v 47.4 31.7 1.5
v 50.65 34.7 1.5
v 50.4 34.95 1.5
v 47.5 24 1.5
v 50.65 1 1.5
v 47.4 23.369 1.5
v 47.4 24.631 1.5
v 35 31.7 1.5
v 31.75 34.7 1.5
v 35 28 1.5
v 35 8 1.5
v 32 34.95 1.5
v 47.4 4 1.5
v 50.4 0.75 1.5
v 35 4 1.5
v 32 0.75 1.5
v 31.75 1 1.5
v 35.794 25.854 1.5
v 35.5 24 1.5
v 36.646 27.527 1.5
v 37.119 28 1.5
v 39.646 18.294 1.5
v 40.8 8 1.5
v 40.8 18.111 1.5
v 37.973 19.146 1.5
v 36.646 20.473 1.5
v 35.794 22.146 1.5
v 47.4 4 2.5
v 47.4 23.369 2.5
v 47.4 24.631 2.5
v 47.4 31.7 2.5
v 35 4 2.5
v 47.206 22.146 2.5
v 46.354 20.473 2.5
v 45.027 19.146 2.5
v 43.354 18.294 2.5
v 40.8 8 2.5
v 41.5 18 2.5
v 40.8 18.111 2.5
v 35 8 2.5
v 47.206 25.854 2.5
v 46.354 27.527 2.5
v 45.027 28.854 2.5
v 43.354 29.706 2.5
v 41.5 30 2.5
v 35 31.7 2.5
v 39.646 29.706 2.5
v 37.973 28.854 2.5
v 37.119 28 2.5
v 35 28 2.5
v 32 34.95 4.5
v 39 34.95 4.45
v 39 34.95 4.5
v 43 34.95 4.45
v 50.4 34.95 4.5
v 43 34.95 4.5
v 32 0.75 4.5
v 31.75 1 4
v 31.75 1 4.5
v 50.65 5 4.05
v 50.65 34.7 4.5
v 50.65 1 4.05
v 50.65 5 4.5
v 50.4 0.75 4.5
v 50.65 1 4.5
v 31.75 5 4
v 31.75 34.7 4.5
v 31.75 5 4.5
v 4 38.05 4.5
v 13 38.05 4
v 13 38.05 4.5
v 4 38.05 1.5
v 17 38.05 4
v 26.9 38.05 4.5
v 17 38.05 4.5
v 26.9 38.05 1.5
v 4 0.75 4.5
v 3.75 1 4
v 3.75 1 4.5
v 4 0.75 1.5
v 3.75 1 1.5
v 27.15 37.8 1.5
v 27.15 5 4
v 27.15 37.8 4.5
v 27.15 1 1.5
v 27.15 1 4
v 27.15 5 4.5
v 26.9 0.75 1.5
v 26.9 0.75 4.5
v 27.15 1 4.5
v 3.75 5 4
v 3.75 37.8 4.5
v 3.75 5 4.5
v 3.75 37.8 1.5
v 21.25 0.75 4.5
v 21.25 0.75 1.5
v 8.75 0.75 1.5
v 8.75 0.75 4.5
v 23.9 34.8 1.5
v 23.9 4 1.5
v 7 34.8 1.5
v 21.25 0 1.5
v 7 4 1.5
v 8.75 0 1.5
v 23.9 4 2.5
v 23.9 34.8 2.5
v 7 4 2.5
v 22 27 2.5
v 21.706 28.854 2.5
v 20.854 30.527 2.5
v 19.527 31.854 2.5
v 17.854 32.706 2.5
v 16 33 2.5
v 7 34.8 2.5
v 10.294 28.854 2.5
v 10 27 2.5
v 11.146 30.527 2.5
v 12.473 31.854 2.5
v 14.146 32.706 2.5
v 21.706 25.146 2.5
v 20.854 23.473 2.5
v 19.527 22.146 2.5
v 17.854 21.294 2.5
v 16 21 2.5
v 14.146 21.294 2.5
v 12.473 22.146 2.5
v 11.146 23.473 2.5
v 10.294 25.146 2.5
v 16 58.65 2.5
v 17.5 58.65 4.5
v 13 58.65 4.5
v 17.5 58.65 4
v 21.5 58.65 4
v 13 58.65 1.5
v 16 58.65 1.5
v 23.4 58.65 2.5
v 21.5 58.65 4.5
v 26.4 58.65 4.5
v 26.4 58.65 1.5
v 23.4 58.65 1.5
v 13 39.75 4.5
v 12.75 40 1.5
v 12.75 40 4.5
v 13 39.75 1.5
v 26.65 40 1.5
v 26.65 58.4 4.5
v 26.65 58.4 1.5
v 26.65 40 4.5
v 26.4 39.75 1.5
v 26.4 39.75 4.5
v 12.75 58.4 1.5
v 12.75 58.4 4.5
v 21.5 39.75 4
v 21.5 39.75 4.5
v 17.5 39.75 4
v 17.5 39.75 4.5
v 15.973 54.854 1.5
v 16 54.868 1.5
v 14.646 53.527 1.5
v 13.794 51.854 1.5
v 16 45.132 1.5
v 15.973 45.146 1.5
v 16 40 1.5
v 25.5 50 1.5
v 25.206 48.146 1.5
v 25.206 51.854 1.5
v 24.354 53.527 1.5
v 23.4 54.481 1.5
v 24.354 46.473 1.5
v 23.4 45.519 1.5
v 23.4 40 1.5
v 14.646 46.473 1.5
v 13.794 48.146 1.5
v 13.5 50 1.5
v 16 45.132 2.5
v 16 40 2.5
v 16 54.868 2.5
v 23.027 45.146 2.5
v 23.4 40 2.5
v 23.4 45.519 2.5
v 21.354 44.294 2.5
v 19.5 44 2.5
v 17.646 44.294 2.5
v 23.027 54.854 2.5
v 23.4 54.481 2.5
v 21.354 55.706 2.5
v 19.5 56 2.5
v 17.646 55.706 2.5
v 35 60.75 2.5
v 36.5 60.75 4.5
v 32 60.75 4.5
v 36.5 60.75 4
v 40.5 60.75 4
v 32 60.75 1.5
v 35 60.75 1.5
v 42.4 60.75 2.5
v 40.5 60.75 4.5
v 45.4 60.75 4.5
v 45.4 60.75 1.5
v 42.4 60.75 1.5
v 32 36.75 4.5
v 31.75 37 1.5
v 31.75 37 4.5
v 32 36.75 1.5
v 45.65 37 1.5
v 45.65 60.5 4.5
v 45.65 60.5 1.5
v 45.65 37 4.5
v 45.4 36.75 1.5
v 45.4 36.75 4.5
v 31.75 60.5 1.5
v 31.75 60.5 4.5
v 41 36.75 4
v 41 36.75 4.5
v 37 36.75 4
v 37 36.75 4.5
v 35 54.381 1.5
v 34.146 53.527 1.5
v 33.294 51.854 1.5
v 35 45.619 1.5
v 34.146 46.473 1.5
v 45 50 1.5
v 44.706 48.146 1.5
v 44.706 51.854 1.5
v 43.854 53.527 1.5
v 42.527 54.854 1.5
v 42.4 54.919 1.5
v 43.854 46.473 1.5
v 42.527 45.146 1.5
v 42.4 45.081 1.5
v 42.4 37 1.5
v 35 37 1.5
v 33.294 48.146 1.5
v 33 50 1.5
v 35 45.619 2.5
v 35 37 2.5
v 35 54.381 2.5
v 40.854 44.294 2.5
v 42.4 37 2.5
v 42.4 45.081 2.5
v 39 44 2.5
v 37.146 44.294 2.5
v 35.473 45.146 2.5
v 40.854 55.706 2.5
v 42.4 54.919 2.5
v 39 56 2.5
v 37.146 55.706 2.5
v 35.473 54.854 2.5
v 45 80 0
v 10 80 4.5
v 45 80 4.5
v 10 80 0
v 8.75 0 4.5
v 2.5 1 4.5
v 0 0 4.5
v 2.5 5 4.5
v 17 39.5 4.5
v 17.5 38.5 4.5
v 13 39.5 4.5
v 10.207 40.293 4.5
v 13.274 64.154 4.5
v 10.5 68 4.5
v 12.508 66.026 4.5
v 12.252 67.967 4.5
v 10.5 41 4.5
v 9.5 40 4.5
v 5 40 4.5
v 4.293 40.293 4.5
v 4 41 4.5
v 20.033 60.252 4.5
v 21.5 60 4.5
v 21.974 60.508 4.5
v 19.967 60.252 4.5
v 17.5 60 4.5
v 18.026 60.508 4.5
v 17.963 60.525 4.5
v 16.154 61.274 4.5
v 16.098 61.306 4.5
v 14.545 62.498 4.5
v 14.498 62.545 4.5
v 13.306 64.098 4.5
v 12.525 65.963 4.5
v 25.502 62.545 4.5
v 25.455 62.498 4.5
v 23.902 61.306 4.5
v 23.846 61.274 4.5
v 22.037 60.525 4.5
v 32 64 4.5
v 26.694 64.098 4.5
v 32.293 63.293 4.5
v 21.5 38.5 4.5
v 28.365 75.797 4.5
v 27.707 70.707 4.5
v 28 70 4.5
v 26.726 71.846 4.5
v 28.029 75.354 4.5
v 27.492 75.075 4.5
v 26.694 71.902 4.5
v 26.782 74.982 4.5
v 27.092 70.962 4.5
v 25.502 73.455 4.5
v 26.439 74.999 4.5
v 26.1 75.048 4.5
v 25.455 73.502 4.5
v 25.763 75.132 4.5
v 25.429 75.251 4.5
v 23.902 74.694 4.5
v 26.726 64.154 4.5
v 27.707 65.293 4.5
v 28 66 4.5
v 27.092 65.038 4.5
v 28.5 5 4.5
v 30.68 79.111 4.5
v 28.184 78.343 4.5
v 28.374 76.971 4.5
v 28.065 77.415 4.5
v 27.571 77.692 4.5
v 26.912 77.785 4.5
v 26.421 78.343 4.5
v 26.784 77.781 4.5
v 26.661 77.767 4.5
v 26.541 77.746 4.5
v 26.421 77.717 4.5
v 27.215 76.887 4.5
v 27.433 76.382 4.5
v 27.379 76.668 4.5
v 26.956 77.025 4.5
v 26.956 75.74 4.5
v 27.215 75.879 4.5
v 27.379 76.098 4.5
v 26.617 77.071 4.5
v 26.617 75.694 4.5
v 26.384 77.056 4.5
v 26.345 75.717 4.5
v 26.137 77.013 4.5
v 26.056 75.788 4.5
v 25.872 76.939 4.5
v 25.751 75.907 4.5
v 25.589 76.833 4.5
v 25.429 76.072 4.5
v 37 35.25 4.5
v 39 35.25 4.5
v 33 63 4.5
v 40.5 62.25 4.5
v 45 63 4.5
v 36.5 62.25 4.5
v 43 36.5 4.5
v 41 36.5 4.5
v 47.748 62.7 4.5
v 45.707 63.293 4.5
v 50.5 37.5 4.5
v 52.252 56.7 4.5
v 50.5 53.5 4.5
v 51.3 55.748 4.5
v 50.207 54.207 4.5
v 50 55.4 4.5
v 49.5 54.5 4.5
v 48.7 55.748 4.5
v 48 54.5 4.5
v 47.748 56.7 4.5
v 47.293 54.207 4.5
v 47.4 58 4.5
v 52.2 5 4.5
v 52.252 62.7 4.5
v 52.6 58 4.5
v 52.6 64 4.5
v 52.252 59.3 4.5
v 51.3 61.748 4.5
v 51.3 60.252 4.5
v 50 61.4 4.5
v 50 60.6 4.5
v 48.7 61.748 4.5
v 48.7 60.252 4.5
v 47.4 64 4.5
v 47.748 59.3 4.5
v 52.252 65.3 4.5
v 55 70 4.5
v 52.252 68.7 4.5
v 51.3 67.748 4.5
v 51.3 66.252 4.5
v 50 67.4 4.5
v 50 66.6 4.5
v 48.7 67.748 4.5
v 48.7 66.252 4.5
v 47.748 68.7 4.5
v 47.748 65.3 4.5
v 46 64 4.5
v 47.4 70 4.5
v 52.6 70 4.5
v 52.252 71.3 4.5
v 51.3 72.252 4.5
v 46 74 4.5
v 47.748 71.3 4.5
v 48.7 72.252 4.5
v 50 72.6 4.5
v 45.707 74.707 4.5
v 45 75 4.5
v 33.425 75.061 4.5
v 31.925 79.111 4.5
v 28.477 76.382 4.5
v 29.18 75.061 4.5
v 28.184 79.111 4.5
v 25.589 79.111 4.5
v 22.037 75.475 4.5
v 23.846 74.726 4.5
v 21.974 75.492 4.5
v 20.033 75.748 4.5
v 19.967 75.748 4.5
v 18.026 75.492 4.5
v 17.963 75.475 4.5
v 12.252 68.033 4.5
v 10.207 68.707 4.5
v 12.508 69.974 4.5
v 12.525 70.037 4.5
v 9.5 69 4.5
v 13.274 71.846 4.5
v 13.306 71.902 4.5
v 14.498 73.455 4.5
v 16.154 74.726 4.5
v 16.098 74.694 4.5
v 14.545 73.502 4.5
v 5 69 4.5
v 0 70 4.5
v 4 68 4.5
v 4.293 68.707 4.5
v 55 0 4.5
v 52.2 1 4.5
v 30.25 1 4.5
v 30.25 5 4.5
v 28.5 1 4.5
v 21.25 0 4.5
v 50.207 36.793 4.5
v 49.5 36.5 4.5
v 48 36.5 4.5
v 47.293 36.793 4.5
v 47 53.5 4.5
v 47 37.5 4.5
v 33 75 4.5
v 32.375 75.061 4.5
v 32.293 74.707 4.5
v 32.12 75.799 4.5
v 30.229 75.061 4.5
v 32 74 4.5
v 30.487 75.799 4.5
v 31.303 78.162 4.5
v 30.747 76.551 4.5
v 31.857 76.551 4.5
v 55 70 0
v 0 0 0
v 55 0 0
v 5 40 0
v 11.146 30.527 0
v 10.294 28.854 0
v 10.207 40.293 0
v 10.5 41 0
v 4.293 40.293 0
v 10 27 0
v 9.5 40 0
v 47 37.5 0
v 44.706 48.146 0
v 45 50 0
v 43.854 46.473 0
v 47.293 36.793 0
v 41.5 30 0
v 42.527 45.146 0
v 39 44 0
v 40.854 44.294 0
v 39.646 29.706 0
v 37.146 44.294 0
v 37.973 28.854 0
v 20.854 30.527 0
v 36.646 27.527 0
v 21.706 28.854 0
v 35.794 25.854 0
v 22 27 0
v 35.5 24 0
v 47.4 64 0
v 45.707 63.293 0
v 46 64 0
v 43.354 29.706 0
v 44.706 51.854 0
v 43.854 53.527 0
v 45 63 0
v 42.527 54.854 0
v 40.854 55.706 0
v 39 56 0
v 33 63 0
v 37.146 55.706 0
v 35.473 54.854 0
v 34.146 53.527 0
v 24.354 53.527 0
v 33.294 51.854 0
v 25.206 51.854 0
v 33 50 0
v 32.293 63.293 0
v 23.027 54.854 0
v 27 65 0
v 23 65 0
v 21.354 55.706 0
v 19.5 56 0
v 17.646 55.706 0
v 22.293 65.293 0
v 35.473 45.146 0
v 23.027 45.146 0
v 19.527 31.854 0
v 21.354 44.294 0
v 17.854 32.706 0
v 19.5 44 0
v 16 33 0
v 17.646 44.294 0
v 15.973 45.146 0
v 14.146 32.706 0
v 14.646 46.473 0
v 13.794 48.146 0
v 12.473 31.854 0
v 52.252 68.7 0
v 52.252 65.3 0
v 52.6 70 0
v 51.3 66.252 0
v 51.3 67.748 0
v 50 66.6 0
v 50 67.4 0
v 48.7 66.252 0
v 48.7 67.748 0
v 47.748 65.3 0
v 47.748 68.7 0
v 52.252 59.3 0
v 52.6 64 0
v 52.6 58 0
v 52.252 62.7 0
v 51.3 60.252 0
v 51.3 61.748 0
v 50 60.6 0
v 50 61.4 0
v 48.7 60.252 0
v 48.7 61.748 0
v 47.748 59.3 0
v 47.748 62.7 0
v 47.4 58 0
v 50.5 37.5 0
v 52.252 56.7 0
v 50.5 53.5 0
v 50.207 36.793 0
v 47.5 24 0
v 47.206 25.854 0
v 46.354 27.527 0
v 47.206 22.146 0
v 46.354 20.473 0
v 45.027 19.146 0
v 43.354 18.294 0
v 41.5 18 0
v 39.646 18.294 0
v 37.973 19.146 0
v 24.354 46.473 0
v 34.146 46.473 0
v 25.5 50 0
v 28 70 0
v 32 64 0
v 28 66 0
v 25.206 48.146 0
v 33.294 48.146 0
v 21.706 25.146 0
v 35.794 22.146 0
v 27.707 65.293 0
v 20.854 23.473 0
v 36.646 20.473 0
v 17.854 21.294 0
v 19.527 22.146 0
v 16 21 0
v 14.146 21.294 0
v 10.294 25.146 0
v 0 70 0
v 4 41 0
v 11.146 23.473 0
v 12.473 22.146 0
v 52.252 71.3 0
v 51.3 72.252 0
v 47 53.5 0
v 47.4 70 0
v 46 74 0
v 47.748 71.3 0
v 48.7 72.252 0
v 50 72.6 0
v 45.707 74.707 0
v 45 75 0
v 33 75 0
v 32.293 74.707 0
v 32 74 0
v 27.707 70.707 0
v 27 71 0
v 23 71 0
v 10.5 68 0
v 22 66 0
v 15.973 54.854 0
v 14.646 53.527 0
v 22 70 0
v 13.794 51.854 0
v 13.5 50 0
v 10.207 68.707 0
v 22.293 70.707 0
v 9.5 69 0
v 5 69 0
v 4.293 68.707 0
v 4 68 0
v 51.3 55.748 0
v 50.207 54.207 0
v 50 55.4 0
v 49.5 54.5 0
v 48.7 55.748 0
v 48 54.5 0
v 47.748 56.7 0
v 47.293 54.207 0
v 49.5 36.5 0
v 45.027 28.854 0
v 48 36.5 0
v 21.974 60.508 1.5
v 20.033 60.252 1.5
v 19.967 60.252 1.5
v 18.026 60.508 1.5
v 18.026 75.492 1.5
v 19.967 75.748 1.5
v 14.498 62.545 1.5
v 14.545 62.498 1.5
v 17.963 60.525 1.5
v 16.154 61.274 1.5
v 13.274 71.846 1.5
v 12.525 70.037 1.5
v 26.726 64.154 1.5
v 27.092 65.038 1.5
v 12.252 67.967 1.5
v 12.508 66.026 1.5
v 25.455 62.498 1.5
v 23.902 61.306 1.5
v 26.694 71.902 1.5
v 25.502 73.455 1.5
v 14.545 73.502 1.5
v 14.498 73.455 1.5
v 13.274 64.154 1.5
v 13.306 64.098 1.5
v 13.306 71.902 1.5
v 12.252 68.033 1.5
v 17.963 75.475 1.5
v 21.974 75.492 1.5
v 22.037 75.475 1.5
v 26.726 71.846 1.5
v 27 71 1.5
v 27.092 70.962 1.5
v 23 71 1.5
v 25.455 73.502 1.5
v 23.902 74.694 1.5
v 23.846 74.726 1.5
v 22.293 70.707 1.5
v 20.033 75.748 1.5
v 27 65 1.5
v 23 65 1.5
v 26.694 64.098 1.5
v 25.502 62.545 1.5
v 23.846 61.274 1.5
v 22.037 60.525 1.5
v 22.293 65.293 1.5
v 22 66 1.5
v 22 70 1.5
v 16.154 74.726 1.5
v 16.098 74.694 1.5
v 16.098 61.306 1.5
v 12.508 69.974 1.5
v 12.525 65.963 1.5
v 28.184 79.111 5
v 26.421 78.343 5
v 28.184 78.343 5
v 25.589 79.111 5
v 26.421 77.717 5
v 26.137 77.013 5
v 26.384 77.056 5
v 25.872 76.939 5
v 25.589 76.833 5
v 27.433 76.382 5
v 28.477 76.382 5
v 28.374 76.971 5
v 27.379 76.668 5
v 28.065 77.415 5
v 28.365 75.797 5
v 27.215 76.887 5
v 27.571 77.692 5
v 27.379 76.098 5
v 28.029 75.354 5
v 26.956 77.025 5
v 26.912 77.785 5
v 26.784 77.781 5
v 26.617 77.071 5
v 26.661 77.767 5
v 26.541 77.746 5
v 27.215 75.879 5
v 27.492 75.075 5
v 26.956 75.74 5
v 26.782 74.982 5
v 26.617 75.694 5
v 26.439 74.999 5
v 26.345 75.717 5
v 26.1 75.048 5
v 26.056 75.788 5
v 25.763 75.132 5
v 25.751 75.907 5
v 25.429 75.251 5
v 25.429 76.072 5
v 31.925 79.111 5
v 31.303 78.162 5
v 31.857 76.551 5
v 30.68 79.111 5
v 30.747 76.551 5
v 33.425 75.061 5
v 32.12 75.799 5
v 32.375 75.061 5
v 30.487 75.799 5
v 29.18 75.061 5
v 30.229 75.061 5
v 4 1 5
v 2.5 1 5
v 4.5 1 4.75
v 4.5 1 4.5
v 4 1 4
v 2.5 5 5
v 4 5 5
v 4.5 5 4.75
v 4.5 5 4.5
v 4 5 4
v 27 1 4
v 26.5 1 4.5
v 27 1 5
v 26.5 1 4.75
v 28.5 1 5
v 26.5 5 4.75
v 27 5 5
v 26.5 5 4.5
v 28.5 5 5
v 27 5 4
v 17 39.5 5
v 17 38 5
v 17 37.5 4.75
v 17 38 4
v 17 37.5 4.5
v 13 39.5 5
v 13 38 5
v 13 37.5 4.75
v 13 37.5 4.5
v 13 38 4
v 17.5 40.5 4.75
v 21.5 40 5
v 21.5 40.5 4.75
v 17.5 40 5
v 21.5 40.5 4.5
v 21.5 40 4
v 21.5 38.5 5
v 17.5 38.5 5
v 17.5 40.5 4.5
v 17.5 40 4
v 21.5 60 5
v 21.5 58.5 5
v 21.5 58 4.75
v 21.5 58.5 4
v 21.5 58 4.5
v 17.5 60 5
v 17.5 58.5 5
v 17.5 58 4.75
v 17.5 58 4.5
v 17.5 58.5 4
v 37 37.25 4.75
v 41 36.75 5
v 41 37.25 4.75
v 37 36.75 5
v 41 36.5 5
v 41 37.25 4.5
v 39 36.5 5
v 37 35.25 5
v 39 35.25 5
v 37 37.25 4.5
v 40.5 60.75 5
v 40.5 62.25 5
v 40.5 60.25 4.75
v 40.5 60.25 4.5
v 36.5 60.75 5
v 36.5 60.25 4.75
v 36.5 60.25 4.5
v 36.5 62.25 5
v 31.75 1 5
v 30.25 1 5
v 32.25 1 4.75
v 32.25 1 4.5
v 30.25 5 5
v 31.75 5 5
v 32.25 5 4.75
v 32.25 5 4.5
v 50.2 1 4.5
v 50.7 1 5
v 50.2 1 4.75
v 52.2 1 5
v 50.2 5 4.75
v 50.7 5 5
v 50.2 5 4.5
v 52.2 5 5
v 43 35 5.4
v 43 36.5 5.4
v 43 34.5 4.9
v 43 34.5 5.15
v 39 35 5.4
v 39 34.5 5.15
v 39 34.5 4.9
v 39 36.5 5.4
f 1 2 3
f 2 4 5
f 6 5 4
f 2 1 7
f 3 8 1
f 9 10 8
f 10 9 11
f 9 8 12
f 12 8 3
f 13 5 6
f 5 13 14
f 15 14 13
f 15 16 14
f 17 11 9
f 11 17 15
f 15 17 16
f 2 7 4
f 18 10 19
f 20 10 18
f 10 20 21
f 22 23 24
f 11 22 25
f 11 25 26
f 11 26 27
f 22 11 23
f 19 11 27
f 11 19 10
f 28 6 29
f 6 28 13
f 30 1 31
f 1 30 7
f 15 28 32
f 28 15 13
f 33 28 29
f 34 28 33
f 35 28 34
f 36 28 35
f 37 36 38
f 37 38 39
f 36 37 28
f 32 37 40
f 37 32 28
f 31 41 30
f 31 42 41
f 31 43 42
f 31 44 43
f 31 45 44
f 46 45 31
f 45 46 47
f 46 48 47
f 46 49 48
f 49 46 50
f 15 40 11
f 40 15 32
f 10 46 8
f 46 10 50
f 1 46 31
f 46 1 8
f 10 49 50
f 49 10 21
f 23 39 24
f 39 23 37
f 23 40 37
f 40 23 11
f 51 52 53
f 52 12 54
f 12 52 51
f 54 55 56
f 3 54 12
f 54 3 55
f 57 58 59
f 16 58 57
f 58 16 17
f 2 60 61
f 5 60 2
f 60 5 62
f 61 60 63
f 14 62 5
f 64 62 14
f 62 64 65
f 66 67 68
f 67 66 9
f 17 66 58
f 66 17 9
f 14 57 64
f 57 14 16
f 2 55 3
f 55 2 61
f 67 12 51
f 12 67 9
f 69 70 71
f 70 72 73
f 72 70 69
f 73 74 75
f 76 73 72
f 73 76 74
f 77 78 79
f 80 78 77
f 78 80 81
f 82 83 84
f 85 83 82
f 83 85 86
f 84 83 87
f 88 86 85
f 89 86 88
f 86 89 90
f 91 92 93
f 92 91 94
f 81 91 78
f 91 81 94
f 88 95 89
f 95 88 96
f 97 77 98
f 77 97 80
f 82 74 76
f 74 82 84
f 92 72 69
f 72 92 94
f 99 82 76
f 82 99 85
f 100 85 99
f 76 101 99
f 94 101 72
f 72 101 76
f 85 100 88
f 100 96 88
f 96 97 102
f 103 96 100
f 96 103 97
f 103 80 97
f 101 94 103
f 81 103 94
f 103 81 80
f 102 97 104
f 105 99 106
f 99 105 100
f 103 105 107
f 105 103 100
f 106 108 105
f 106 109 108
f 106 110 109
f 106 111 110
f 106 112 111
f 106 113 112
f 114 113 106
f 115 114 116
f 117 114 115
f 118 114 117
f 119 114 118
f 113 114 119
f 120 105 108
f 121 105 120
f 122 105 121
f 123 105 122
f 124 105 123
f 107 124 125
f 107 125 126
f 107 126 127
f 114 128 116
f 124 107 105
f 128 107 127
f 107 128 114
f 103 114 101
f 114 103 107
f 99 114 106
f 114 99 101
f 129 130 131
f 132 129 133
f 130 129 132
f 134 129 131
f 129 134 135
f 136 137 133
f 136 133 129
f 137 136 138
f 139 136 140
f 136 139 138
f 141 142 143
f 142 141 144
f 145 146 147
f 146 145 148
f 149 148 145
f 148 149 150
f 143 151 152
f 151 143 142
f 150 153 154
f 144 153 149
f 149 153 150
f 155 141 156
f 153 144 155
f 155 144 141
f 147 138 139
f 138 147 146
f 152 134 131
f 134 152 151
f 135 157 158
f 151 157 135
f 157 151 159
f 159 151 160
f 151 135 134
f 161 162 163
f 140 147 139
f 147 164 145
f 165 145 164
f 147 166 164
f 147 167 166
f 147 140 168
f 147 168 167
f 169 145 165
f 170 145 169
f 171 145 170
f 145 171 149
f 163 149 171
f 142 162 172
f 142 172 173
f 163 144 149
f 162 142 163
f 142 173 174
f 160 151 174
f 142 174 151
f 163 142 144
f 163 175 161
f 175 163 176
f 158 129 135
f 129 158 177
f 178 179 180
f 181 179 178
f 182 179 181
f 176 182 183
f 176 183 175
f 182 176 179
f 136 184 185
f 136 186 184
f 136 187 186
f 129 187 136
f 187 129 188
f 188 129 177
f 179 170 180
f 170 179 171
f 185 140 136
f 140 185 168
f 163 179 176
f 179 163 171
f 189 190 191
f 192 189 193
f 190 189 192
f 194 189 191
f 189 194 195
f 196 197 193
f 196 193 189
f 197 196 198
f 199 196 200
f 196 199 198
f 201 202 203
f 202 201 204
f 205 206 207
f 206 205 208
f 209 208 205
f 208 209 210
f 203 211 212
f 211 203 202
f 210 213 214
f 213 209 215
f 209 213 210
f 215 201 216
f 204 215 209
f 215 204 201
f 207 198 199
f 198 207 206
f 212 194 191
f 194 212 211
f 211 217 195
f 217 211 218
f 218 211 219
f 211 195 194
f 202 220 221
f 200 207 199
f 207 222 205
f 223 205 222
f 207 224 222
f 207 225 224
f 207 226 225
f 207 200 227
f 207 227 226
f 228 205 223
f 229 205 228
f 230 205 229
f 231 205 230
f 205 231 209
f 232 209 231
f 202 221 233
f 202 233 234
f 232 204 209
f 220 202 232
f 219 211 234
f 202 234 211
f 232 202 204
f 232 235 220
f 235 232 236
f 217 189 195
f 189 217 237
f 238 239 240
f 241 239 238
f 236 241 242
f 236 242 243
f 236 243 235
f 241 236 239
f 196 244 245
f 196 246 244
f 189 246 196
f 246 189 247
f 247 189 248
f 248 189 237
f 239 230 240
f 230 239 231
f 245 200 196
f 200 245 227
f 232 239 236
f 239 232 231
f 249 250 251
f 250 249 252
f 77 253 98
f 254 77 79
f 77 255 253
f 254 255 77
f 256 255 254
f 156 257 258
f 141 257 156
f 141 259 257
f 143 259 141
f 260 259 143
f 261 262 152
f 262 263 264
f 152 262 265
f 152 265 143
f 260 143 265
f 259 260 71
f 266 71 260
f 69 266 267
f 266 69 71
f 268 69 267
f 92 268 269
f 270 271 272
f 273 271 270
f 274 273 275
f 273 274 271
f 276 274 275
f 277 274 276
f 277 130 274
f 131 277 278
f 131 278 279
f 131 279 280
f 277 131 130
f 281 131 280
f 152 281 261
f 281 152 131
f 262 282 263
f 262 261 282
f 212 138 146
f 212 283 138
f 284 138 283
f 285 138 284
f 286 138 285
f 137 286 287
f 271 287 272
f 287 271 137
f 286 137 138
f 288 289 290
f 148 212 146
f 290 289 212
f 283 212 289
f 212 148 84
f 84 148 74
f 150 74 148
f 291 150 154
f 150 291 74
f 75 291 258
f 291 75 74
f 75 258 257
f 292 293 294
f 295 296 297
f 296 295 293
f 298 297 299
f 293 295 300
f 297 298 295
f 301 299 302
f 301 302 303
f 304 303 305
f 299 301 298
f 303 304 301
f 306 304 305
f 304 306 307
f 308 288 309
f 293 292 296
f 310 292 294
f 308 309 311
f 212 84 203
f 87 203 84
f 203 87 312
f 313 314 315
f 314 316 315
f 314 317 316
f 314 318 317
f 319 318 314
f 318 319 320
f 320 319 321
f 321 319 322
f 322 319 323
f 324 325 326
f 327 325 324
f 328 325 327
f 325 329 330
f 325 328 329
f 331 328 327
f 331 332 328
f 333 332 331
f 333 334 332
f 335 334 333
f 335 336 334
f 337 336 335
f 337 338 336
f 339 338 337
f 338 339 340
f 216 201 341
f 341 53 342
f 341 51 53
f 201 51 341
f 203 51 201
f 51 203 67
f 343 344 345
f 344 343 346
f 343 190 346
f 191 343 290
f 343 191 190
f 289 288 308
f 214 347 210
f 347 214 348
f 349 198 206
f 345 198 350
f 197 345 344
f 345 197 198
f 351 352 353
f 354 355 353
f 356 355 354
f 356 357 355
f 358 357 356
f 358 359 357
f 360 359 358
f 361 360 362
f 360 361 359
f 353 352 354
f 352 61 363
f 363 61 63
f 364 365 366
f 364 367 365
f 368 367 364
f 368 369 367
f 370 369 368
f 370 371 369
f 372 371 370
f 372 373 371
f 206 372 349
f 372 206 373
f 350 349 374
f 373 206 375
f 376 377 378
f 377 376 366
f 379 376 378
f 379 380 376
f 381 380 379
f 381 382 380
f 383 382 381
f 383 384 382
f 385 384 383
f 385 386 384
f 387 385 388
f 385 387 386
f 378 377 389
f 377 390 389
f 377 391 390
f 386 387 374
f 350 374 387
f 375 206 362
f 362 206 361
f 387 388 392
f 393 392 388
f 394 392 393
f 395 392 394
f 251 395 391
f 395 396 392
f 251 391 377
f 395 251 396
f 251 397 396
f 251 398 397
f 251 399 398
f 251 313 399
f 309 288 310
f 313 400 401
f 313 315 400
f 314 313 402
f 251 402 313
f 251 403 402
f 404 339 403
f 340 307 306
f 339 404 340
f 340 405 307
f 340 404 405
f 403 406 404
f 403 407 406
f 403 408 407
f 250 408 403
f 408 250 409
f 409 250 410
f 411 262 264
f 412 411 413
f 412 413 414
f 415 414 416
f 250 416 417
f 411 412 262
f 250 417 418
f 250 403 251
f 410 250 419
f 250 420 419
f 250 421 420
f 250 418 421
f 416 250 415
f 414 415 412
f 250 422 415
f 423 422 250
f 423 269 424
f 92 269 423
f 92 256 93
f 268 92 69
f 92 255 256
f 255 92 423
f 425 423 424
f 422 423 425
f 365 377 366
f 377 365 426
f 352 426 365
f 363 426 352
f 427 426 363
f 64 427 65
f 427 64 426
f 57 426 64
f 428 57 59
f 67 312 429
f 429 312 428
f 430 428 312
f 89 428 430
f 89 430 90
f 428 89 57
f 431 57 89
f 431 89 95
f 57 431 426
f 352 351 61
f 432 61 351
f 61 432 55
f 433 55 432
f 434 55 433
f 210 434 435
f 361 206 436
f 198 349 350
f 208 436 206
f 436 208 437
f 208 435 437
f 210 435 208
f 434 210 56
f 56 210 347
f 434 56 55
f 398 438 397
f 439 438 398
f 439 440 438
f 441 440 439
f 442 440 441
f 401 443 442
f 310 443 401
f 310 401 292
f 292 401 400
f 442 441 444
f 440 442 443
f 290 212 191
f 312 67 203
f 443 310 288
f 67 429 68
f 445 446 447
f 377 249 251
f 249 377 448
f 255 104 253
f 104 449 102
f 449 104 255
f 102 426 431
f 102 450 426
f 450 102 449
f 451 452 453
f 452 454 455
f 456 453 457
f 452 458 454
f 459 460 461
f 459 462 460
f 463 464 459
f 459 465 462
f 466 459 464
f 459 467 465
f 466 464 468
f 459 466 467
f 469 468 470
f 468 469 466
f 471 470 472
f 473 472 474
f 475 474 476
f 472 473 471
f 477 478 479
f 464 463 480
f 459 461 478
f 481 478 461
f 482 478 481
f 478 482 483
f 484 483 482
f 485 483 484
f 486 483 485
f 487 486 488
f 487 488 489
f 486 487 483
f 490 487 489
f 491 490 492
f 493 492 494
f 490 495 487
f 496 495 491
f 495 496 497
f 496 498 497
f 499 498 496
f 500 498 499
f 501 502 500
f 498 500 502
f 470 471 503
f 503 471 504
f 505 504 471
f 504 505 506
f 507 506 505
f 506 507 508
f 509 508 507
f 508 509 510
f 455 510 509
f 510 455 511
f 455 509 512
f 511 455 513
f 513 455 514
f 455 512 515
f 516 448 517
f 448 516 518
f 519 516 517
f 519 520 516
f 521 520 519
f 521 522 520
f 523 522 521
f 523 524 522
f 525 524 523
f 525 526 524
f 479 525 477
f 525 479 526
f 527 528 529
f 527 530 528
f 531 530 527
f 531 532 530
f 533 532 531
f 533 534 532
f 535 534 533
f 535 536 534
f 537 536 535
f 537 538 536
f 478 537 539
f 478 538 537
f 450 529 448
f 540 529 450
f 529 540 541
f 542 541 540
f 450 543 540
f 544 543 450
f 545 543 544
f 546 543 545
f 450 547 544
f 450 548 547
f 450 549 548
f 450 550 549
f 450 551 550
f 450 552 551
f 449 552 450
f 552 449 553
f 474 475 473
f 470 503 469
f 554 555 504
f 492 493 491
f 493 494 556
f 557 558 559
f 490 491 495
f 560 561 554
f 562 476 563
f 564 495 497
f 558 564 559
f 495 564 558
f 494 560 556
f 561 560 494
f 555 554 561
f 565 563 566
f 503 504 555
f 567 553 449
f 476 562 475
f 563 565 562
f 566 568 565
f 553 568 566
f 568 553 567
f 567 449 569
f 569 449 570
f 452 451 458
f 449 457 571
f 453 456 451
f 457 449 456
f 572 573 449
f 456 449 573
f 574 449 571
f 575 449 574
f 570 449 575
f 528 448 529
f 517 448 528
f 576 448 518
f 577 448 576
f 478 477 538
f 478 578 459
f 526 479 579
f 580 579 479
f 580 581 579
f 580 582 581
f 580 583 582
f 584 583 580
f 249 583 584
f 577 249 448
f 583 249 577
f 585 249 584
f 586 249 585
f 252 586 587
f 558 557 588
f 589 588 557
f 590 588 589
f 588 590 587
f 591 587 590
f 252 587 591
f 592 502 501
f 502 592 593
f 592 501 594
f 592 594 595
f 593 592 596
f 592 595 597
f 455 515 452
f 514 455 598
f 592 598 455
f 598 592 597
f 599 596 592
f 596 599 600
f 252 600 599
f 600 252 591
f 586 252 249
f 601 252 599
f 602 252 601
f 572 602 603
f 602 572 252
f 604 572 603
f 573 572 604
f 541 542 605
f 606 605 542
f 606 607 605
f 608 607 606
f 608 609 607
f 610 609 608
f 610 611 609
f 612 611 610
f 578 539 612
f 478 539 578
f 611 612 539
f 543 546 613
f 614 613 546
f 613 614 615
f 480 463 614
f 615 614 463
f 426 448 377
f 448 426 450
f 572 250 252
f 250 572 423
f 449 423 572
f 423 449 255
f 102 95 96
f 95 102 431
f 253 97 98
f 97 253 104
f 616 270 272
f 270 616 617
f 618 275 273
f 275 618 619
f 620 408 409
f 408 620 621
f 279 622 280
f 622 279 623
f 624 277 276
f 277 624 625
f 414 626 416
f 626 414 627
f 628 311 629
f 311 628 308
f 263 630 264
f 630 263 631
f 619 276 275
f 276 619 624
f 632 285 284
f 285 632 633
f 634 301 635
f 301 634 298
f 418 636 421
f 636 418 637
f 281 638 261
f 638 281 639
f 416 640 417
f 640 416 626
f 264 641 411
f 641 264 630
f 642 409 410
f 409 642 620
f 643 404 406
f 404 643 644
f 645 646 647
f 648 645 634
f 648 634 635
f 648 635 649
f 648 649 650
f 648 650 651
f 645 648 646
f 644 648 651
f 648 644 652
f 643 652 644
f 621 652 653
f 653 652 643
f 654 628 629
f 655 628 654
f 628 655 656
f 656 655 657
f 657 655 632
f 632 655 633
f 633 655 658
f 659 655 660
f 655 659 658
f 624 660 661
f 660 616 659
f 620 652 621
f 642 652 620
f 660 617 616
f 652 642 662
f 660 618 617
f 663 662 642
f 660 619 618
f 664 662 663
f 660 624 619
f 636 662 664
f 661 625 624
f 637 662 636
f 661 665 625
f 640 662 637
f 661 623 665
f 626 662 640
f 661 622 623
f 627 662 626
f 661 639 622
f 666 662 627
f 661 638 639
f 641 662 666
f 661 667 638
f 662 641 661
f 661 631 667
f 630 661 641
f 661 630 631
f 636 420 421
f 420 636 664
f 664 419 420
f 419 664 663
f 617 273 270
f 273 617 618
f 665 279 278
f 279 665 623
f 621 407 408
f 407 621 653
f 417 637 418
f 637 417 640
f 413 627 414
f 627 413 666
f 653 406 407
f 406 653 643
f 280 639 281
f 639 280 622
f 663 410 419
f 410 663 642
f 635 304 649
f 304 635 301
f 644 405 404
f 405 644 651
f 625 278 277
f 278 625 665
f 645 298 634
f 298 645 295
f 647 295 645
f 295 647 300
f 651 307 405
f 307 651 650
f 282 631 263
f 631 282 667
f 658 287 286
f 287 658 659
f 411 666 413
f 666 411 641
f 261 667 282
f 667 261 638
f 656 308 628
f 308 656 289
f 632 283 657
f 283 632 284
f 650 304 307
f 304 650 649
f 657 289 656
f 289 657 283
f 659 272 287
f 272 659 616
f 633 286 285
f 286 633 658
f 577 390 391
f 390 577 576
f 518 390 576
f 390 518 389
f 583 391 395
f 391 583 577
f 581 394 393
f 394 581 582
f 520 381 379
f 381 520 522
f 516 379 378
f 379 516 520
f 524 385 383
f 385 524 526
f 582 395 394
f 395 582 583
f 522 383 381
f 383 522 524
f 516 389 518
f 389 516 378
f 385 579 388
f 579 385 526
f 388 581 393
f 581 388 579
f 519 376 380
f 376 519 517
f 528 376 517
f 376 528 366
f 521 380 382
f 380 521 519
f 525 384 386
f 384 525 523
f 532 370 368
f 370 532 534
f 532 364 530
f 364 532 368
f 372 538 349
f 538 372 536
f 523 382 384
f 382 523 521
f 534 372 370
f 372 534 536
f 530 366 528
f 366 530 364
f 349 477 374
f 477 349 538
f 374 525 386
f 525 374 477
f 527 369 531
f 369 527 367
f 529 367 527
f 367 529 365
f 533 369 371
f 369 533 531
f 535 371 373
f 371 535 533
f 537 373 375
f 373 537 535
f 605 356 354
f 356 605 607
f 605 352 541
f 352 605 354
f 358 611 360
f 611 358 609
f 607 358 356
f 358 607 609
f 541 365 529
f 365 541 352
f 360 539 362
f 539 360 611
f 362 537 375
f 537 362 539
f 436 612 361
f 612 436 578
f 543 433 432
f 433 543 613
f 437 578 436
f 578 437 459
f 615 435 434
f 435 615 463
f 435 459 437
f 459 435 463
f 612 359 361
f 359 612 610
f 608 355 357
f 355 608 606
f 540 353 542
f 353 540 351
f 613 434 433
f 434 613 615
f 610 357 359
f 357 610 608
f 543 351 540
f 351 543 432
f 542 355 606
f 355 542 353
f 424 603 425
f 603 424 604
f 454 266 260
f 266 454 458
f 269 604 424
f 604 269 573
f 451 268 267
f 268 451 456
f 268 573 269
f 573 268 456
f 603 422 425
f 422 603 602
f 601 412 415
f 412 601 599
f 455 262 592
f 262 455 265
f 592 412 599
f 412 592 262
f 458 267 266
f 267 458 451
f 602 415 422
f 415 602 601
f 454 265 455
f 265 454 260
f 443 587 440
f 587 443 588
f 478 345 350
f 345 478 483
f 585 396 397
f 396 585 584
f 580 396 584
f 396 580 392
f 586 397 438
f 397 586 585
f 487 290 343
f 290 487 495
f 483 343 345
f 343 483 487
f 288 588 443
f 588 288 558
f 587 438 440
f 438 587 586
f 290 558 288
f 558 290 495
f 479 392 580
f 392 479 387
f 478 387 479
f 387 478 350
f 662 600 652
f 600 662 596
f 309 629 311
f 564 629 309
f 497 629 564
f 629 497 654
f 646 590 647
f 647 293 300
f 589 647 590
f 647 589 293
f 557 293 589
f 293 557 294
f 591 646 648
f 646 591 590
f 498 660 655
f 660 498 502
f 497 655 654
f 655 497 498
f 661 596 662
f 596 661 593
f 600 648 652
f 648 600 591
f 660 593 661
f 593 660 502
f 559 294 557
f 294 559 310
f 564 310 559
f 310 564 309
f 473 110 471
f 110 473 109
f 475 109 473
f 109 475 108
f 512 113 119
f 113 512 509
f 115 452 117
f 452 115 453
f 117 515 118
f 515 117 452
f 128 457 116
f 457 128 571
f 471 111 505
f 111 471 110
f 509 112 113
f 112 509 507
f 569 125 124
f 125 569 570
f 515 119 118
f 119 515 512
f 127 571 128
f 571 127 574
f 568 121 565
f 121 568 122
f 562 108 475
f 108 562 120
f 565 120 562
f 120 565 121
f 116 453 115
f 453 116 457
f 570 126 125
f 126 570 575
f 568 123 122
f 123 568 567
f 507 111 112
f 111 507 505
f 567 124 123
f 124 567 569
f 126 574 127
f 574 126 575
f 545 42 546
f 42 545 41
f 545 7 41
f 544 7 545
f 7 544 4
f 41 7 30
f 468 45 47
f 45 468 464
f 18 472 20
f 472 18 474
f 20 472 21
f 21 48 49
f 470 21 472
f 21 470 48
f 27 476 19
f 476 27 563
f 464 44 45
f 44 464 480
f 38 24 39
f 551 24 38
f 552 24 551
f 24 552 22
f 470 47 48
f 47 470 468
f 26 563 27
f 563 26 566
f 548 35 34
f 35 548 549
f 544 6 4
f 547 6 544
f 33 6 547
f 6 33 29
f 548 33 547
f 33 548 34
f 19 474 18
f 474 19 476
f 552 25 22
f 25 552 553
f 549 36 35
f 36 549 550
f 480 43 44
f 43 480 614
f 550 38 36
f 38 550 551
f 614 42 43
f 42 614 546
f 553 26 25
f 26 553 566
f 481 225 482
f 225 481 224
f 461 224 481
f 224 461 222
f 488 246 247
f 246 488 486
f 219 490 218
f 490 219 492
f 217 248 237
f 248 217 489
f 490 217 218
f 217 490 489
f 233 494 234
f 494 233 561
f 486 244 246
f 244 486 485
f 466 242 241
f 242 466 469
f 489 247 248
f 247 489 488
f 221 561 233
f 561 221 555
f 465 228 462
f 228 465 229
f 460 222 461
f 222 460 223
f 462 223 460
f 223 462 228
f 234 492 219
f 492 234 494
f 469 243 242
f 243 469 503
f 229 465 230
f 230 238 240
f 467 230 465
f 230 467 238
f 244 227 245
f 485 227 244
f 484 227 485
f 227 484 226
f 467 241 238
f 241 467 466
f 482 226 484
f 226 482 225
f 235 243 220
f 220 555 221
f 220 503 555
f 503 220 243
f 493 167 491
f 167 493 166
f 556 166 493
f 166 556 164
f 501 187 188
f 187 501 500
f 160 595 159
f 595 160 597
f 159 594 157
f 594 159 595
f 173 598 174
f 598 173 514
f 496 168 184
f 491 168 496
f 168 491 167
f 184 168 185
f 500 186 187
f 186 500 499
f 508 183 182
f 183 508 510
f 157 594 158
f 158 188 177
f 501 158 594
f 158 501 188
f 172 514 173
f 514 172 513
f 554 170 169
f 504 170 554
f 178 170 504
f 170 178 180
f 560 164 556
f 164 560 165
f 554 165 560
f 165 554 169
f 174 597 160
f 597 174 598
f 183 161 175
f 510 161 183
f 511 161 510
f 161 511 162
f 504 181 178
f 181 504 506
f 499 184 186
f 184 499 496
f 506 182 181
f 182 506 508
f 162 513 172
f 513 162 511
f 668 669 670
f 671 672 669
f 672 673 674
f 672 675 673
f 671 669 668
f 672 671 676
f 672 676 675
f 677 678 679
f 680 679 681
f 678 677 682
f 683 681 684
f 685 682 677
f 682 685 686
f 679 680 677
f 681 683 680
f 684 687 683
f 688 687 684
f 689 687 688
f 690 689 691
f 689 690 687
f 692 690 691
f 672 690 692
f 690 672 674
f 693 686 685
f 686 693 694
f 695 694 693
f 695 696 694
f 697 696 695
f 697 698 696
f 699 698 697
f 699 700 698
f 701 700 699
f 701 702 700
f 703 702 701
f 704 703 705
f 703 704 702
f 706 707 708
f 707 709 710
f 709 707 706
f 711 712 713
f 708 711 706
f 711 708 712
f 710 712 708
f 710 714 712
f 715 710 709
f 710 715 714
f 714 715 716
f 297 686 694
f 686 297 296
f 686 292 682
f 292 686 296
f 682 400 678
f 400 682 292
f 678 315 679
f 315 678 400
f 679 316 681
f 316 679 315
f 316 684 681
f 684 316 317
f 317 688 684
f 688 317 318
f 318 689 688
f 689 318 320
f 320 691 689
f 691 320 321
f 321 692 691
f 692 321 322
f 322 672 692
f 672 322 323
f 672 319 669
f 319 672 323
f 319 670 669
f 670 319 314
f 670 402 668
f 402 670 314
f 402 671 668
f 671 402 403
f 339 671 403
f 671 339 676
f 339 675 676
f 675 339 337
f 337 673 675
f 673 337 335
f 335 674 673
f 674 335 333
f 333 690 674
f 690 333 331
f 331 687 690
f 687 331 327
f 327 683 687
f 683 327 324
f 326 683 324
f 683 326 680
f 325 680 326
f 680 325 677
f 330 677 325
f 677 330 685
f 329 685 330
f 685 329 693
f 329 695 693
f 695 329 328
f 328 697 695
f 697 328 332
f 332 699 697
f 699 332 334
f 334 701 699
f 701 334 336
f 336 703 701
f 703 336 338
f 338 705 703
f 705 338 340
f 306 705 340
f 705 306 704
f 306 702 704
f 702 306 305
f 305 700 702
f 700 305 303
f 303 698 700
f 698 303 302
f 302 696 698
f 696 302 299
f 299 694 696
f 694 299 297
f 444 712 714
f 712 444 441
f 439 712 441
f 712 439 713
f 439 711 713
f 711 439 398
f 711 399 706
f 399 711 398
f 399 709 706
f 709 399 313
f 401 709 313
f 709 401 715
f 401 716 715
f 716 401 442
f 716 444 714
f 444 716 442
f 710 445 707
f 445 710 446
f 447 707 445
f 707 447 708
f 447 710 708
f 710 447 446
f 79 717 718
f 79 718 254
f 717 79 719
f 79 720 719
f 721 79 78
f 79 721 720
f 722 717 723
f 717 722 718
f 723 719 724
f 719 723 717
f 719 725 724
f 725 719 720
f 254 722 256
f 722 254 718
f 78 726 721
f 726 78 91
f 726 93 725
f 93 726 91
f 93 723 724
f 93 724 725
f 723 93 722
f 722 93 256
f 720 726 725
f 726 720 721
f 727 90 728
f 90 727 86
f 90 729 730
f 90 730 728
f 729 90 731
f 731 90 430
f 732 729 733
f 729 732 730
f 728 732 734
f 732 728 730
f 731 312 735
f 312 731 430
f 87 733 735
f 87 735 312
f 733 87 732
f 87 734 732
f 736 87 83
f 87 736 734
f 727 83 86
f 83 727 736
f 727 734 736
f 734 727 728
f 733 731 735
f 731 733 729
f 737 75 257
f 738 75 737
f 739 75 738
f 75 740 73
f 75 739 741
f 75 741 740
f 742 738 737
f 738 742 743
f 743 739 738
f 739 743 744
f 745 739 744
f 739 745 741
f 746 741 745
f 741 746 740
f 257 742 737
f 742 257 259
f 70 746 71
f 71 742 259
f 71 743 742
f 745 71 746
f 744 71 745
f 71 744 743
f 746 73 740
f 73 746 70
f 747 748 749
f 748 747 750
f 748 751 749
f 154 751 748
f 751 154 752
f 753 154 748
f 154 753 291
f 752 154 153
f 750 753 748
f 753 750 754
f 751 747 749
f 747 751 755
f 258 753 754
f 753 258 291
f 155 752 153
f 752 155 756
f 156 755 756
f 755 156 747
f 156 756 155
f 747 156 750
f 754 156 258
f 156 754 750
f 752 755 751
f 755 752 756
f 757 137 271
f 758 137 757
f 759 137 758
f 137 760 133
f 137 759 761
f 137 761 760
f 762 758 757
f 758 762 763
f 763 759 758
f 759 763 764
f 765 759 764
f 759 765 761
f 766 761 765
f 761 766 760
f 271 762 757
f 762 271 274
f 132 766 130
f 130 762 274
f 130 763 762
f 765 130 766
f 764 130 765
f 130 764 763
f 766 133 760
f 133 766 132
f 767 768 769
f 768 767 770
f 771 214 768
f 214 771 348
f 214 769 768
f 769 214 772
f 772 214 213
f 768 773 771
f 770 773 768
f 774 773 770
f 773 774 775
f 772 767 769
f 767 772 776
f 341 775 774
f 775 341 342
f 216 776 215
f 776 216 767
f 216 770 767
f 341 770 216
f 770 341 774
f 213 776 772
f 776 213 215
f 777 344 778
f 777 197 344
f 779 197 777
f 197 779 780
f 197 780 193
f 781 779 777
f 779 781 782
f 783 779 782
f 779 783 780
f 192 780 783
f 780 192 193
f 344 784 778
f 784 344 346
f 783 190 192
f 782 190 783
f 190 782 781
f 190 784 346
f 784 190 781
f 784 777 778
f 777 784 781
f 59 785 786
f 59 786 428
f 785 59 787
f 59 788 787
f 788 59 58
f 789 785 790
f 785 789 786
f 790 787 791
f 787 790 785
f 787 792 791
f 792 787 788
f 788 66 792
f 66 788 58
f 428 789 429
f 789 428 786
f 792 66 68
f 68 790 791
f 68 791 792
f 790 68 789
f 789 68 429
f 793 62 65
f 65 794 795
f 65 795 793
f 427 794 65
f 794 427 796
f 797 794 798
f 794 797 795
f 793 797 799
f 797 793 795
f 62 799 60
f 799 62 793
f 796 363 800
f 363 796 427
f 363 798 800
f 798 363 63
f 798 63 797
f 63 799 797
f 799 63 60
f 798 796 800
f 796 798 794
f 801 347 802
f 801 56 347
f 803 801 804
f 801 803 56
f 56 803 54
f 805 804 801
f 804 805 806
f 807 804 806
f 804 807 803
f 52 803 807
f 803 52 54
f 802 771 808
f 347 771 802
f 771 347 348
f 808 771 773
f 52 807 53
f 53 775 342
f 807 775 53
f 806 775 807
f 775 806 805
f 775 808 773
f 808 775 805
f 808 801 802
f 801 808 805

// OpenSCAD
tol=0.25;
extra=4;


difference(){   // cut the board and components out of 
    // the base plate #1
    
// Base 1 plate
B1p=[ [0,0], [55,0], [55,70], [45,80],
[10,80], [0,70] ];
translate([0,0,0]) color("gray")
linear_extrude(height=4.5)
polygon(points=B1p);

//union(){
// Pro Mini
translate([32,1,1.5]) color("red"){
    difference(){
        linear_extrude(height=0.86+extra) 
        offset(r=tol) square(size=[18.4, 33.7]);

        difference(){
        linear_extrude(height=1) 
        offset(r=-3) square(size=[18.4, 33.7]);

        linear_extrude(height=1) 
        translate([2.8,7,0]) square(size=[6,20]);
        }

    }
}

// Adafruit PowerBoost 1000c
translate([4,1,1.5]) color("blue"){
    difference(){
        linear_extrude(height=1.7+extra) 
        offset(r=tol) square(size=[22.9, 36.8]);

        linear_extrude(height=1) 
        offset(r=-3) square(size=[22.9, 36.8]);
    }
}
// notch for the USB charger cable
translate([9,0,1.5]) color("pink"){
    linear_extrude(height=1.7+extra) 
        offset(r=tol) square(size=[12, 2]);
}

// TXB0104 Level Shifter
translate([13,40,1.5]) color("green") {
    difference(){
        linear_extrude(height=1.7+extra) 
        offset(r=tol) square(size=[13.4, 18.4]);
            
        linear_extrude(height=1) 
        translate([3,0,0]) square(size=[7.4, 22]);
    }
}

// LIS3DH
translate([32,37,1.5]) color("yellow") {
    difference(){
        linear_extrude(height=1.7+extra) 
        offset(r=tol) square(size=[13.4, 23.5]);
            
        linear_extrude(height=1) 
        translate([3,0,0]) square(size=[7.4, 26]);
    } 
}

// Piezo
translate([20,68,1.5]) color("orange") {
    linear_extrude(height=1.4+extra) 
    offset(r=tol)
     circle(r=7.5);
}
/*
// centerline holes
for(i=[0:1:13]){
translate([29.4,8+i*4,-2]) color("red") {
cylinder(h=8,r=1.5,$fn=12);
}
}
// leftline holes
for(i=[0:1:20]){
translate([2,8+i*3,-2]) color("red") {
cylinder(h=8,r=1.0,$fn=12);
}
}

// rightline holes
for(i=[0:1:15]){
translate([52.5,8+i*3,-2]) color("red") {
cylinder(h=8,r=1.0,$fn=12);
}
}
*/
// Led holes
translate([50,70,-2]) color("red") {
cylinder(h=8,r=2.6,$fn=12);
}
translate([50,64,-2]) color("yellow") {
cylinder(h=8,r=2.6,$fn=12);
}
translate([50,58,-2]) color("green") {
cylinder(h=8,r=2.6,$fn=12);
}

// Wire Pass-thru also lightweighting
translate([48,37.5,-2]) color("black") {
    linear_extrude(height=12) 
    offset(r=1,$fn=8) square(size=[1.5,16]);
}
translate([5,41,-2]) color("black") {
    linear_extrude(height=12) 
    offset(r=1, $fn=8) square(size=[4.5,27]);
}
translate([33,64,-2]) color("black") {
    linear_extrude(height=12) 
    offset(r=1,$fn=8) square(size=[12,10]);
}
translate([23,66,-2]) color("black") {
    linear_extrude(height=12) 
    offset(r=1,$fn=8) square(size=[4,4]);
}

// Popouts for the boards
translate([16,27,-2]) color("cyan") {
cylinder(h=12,r=6,$fn=20);
}
translate([41.5,24,-2]) color("cyan") {
cylinder(h=12,r=6,$fn=20);
}
translate([39,50,-2]) color("cyan") {
cylinder(h=12,r=6,$fn=20);
}
translate([19.5,50,-2]) color("cyan") {
cylinder(h=12,r=6,$fn=20);
}


} // end of diffence

// add text
translate ([25,77,3.5]) color("red") 
    linear_extrude(height=1.5){
    text("5A", font = "Open Sans:style=Bold", size=4,halign="left",valign="center",spacing=1.1);
    }



pt1=[ [0,0], [0.5,0.5], [0.5,0.75], [0,1], [-1.5,1], [-1.5,0] ];
// retainer tabs blue
translate([4,5,4]) color("orange") {
    rotate([90,0,0]) linear_extrude(height=4) polygon(points=pt1);
}
translate([27,1,4]) color("orange") {
    rotate([90,0,180]) linear_extrude(height=4) polygon(points=pt1);
}
translate([17,38,4]) color("orange") {
    rotate([90,0,-90]) linear_extrude(height=4) polygon(points=pt1);
}
    
// retainer tabs green
translate([17.5,40,4]) color("orange") {
    rotate([90,0,90]) linear_extrude(height=4) polygon(points=pt1);
}
translate([21.5,58.5,4]) color("orange") {
    rotate([90,0,-90]) linear_extrude(height=4) polygon(points=pt1);
}

// retainer tabs yellow
translate([37,36.75,4]) color("orange") {
    rotate([90,0,90]) linear_extrude(height=4) polygon(points=pt1);
}
translate([40.5,60.75,4]) color("orange") {
    rotate([90,0,-90]) linear_extrude(height=4) polygon(points=pt1);
}

// retainer tabs red
translate([31.75,5,4]) color("orange") {
    rotate([90,0,0]) linear_extrude(height=4) polygon(points=pt1);
}
translate([50.7,1,4]) color("orange") {
    rotate([90,0,180]) linear_extrude(height=4) polygon(points=pt1);
}
translate([43,35,4.4]) color("orange") {
    rotate([90,0,-90]) linear_extrude(height=4) polygon(points=pt1);
}
    
